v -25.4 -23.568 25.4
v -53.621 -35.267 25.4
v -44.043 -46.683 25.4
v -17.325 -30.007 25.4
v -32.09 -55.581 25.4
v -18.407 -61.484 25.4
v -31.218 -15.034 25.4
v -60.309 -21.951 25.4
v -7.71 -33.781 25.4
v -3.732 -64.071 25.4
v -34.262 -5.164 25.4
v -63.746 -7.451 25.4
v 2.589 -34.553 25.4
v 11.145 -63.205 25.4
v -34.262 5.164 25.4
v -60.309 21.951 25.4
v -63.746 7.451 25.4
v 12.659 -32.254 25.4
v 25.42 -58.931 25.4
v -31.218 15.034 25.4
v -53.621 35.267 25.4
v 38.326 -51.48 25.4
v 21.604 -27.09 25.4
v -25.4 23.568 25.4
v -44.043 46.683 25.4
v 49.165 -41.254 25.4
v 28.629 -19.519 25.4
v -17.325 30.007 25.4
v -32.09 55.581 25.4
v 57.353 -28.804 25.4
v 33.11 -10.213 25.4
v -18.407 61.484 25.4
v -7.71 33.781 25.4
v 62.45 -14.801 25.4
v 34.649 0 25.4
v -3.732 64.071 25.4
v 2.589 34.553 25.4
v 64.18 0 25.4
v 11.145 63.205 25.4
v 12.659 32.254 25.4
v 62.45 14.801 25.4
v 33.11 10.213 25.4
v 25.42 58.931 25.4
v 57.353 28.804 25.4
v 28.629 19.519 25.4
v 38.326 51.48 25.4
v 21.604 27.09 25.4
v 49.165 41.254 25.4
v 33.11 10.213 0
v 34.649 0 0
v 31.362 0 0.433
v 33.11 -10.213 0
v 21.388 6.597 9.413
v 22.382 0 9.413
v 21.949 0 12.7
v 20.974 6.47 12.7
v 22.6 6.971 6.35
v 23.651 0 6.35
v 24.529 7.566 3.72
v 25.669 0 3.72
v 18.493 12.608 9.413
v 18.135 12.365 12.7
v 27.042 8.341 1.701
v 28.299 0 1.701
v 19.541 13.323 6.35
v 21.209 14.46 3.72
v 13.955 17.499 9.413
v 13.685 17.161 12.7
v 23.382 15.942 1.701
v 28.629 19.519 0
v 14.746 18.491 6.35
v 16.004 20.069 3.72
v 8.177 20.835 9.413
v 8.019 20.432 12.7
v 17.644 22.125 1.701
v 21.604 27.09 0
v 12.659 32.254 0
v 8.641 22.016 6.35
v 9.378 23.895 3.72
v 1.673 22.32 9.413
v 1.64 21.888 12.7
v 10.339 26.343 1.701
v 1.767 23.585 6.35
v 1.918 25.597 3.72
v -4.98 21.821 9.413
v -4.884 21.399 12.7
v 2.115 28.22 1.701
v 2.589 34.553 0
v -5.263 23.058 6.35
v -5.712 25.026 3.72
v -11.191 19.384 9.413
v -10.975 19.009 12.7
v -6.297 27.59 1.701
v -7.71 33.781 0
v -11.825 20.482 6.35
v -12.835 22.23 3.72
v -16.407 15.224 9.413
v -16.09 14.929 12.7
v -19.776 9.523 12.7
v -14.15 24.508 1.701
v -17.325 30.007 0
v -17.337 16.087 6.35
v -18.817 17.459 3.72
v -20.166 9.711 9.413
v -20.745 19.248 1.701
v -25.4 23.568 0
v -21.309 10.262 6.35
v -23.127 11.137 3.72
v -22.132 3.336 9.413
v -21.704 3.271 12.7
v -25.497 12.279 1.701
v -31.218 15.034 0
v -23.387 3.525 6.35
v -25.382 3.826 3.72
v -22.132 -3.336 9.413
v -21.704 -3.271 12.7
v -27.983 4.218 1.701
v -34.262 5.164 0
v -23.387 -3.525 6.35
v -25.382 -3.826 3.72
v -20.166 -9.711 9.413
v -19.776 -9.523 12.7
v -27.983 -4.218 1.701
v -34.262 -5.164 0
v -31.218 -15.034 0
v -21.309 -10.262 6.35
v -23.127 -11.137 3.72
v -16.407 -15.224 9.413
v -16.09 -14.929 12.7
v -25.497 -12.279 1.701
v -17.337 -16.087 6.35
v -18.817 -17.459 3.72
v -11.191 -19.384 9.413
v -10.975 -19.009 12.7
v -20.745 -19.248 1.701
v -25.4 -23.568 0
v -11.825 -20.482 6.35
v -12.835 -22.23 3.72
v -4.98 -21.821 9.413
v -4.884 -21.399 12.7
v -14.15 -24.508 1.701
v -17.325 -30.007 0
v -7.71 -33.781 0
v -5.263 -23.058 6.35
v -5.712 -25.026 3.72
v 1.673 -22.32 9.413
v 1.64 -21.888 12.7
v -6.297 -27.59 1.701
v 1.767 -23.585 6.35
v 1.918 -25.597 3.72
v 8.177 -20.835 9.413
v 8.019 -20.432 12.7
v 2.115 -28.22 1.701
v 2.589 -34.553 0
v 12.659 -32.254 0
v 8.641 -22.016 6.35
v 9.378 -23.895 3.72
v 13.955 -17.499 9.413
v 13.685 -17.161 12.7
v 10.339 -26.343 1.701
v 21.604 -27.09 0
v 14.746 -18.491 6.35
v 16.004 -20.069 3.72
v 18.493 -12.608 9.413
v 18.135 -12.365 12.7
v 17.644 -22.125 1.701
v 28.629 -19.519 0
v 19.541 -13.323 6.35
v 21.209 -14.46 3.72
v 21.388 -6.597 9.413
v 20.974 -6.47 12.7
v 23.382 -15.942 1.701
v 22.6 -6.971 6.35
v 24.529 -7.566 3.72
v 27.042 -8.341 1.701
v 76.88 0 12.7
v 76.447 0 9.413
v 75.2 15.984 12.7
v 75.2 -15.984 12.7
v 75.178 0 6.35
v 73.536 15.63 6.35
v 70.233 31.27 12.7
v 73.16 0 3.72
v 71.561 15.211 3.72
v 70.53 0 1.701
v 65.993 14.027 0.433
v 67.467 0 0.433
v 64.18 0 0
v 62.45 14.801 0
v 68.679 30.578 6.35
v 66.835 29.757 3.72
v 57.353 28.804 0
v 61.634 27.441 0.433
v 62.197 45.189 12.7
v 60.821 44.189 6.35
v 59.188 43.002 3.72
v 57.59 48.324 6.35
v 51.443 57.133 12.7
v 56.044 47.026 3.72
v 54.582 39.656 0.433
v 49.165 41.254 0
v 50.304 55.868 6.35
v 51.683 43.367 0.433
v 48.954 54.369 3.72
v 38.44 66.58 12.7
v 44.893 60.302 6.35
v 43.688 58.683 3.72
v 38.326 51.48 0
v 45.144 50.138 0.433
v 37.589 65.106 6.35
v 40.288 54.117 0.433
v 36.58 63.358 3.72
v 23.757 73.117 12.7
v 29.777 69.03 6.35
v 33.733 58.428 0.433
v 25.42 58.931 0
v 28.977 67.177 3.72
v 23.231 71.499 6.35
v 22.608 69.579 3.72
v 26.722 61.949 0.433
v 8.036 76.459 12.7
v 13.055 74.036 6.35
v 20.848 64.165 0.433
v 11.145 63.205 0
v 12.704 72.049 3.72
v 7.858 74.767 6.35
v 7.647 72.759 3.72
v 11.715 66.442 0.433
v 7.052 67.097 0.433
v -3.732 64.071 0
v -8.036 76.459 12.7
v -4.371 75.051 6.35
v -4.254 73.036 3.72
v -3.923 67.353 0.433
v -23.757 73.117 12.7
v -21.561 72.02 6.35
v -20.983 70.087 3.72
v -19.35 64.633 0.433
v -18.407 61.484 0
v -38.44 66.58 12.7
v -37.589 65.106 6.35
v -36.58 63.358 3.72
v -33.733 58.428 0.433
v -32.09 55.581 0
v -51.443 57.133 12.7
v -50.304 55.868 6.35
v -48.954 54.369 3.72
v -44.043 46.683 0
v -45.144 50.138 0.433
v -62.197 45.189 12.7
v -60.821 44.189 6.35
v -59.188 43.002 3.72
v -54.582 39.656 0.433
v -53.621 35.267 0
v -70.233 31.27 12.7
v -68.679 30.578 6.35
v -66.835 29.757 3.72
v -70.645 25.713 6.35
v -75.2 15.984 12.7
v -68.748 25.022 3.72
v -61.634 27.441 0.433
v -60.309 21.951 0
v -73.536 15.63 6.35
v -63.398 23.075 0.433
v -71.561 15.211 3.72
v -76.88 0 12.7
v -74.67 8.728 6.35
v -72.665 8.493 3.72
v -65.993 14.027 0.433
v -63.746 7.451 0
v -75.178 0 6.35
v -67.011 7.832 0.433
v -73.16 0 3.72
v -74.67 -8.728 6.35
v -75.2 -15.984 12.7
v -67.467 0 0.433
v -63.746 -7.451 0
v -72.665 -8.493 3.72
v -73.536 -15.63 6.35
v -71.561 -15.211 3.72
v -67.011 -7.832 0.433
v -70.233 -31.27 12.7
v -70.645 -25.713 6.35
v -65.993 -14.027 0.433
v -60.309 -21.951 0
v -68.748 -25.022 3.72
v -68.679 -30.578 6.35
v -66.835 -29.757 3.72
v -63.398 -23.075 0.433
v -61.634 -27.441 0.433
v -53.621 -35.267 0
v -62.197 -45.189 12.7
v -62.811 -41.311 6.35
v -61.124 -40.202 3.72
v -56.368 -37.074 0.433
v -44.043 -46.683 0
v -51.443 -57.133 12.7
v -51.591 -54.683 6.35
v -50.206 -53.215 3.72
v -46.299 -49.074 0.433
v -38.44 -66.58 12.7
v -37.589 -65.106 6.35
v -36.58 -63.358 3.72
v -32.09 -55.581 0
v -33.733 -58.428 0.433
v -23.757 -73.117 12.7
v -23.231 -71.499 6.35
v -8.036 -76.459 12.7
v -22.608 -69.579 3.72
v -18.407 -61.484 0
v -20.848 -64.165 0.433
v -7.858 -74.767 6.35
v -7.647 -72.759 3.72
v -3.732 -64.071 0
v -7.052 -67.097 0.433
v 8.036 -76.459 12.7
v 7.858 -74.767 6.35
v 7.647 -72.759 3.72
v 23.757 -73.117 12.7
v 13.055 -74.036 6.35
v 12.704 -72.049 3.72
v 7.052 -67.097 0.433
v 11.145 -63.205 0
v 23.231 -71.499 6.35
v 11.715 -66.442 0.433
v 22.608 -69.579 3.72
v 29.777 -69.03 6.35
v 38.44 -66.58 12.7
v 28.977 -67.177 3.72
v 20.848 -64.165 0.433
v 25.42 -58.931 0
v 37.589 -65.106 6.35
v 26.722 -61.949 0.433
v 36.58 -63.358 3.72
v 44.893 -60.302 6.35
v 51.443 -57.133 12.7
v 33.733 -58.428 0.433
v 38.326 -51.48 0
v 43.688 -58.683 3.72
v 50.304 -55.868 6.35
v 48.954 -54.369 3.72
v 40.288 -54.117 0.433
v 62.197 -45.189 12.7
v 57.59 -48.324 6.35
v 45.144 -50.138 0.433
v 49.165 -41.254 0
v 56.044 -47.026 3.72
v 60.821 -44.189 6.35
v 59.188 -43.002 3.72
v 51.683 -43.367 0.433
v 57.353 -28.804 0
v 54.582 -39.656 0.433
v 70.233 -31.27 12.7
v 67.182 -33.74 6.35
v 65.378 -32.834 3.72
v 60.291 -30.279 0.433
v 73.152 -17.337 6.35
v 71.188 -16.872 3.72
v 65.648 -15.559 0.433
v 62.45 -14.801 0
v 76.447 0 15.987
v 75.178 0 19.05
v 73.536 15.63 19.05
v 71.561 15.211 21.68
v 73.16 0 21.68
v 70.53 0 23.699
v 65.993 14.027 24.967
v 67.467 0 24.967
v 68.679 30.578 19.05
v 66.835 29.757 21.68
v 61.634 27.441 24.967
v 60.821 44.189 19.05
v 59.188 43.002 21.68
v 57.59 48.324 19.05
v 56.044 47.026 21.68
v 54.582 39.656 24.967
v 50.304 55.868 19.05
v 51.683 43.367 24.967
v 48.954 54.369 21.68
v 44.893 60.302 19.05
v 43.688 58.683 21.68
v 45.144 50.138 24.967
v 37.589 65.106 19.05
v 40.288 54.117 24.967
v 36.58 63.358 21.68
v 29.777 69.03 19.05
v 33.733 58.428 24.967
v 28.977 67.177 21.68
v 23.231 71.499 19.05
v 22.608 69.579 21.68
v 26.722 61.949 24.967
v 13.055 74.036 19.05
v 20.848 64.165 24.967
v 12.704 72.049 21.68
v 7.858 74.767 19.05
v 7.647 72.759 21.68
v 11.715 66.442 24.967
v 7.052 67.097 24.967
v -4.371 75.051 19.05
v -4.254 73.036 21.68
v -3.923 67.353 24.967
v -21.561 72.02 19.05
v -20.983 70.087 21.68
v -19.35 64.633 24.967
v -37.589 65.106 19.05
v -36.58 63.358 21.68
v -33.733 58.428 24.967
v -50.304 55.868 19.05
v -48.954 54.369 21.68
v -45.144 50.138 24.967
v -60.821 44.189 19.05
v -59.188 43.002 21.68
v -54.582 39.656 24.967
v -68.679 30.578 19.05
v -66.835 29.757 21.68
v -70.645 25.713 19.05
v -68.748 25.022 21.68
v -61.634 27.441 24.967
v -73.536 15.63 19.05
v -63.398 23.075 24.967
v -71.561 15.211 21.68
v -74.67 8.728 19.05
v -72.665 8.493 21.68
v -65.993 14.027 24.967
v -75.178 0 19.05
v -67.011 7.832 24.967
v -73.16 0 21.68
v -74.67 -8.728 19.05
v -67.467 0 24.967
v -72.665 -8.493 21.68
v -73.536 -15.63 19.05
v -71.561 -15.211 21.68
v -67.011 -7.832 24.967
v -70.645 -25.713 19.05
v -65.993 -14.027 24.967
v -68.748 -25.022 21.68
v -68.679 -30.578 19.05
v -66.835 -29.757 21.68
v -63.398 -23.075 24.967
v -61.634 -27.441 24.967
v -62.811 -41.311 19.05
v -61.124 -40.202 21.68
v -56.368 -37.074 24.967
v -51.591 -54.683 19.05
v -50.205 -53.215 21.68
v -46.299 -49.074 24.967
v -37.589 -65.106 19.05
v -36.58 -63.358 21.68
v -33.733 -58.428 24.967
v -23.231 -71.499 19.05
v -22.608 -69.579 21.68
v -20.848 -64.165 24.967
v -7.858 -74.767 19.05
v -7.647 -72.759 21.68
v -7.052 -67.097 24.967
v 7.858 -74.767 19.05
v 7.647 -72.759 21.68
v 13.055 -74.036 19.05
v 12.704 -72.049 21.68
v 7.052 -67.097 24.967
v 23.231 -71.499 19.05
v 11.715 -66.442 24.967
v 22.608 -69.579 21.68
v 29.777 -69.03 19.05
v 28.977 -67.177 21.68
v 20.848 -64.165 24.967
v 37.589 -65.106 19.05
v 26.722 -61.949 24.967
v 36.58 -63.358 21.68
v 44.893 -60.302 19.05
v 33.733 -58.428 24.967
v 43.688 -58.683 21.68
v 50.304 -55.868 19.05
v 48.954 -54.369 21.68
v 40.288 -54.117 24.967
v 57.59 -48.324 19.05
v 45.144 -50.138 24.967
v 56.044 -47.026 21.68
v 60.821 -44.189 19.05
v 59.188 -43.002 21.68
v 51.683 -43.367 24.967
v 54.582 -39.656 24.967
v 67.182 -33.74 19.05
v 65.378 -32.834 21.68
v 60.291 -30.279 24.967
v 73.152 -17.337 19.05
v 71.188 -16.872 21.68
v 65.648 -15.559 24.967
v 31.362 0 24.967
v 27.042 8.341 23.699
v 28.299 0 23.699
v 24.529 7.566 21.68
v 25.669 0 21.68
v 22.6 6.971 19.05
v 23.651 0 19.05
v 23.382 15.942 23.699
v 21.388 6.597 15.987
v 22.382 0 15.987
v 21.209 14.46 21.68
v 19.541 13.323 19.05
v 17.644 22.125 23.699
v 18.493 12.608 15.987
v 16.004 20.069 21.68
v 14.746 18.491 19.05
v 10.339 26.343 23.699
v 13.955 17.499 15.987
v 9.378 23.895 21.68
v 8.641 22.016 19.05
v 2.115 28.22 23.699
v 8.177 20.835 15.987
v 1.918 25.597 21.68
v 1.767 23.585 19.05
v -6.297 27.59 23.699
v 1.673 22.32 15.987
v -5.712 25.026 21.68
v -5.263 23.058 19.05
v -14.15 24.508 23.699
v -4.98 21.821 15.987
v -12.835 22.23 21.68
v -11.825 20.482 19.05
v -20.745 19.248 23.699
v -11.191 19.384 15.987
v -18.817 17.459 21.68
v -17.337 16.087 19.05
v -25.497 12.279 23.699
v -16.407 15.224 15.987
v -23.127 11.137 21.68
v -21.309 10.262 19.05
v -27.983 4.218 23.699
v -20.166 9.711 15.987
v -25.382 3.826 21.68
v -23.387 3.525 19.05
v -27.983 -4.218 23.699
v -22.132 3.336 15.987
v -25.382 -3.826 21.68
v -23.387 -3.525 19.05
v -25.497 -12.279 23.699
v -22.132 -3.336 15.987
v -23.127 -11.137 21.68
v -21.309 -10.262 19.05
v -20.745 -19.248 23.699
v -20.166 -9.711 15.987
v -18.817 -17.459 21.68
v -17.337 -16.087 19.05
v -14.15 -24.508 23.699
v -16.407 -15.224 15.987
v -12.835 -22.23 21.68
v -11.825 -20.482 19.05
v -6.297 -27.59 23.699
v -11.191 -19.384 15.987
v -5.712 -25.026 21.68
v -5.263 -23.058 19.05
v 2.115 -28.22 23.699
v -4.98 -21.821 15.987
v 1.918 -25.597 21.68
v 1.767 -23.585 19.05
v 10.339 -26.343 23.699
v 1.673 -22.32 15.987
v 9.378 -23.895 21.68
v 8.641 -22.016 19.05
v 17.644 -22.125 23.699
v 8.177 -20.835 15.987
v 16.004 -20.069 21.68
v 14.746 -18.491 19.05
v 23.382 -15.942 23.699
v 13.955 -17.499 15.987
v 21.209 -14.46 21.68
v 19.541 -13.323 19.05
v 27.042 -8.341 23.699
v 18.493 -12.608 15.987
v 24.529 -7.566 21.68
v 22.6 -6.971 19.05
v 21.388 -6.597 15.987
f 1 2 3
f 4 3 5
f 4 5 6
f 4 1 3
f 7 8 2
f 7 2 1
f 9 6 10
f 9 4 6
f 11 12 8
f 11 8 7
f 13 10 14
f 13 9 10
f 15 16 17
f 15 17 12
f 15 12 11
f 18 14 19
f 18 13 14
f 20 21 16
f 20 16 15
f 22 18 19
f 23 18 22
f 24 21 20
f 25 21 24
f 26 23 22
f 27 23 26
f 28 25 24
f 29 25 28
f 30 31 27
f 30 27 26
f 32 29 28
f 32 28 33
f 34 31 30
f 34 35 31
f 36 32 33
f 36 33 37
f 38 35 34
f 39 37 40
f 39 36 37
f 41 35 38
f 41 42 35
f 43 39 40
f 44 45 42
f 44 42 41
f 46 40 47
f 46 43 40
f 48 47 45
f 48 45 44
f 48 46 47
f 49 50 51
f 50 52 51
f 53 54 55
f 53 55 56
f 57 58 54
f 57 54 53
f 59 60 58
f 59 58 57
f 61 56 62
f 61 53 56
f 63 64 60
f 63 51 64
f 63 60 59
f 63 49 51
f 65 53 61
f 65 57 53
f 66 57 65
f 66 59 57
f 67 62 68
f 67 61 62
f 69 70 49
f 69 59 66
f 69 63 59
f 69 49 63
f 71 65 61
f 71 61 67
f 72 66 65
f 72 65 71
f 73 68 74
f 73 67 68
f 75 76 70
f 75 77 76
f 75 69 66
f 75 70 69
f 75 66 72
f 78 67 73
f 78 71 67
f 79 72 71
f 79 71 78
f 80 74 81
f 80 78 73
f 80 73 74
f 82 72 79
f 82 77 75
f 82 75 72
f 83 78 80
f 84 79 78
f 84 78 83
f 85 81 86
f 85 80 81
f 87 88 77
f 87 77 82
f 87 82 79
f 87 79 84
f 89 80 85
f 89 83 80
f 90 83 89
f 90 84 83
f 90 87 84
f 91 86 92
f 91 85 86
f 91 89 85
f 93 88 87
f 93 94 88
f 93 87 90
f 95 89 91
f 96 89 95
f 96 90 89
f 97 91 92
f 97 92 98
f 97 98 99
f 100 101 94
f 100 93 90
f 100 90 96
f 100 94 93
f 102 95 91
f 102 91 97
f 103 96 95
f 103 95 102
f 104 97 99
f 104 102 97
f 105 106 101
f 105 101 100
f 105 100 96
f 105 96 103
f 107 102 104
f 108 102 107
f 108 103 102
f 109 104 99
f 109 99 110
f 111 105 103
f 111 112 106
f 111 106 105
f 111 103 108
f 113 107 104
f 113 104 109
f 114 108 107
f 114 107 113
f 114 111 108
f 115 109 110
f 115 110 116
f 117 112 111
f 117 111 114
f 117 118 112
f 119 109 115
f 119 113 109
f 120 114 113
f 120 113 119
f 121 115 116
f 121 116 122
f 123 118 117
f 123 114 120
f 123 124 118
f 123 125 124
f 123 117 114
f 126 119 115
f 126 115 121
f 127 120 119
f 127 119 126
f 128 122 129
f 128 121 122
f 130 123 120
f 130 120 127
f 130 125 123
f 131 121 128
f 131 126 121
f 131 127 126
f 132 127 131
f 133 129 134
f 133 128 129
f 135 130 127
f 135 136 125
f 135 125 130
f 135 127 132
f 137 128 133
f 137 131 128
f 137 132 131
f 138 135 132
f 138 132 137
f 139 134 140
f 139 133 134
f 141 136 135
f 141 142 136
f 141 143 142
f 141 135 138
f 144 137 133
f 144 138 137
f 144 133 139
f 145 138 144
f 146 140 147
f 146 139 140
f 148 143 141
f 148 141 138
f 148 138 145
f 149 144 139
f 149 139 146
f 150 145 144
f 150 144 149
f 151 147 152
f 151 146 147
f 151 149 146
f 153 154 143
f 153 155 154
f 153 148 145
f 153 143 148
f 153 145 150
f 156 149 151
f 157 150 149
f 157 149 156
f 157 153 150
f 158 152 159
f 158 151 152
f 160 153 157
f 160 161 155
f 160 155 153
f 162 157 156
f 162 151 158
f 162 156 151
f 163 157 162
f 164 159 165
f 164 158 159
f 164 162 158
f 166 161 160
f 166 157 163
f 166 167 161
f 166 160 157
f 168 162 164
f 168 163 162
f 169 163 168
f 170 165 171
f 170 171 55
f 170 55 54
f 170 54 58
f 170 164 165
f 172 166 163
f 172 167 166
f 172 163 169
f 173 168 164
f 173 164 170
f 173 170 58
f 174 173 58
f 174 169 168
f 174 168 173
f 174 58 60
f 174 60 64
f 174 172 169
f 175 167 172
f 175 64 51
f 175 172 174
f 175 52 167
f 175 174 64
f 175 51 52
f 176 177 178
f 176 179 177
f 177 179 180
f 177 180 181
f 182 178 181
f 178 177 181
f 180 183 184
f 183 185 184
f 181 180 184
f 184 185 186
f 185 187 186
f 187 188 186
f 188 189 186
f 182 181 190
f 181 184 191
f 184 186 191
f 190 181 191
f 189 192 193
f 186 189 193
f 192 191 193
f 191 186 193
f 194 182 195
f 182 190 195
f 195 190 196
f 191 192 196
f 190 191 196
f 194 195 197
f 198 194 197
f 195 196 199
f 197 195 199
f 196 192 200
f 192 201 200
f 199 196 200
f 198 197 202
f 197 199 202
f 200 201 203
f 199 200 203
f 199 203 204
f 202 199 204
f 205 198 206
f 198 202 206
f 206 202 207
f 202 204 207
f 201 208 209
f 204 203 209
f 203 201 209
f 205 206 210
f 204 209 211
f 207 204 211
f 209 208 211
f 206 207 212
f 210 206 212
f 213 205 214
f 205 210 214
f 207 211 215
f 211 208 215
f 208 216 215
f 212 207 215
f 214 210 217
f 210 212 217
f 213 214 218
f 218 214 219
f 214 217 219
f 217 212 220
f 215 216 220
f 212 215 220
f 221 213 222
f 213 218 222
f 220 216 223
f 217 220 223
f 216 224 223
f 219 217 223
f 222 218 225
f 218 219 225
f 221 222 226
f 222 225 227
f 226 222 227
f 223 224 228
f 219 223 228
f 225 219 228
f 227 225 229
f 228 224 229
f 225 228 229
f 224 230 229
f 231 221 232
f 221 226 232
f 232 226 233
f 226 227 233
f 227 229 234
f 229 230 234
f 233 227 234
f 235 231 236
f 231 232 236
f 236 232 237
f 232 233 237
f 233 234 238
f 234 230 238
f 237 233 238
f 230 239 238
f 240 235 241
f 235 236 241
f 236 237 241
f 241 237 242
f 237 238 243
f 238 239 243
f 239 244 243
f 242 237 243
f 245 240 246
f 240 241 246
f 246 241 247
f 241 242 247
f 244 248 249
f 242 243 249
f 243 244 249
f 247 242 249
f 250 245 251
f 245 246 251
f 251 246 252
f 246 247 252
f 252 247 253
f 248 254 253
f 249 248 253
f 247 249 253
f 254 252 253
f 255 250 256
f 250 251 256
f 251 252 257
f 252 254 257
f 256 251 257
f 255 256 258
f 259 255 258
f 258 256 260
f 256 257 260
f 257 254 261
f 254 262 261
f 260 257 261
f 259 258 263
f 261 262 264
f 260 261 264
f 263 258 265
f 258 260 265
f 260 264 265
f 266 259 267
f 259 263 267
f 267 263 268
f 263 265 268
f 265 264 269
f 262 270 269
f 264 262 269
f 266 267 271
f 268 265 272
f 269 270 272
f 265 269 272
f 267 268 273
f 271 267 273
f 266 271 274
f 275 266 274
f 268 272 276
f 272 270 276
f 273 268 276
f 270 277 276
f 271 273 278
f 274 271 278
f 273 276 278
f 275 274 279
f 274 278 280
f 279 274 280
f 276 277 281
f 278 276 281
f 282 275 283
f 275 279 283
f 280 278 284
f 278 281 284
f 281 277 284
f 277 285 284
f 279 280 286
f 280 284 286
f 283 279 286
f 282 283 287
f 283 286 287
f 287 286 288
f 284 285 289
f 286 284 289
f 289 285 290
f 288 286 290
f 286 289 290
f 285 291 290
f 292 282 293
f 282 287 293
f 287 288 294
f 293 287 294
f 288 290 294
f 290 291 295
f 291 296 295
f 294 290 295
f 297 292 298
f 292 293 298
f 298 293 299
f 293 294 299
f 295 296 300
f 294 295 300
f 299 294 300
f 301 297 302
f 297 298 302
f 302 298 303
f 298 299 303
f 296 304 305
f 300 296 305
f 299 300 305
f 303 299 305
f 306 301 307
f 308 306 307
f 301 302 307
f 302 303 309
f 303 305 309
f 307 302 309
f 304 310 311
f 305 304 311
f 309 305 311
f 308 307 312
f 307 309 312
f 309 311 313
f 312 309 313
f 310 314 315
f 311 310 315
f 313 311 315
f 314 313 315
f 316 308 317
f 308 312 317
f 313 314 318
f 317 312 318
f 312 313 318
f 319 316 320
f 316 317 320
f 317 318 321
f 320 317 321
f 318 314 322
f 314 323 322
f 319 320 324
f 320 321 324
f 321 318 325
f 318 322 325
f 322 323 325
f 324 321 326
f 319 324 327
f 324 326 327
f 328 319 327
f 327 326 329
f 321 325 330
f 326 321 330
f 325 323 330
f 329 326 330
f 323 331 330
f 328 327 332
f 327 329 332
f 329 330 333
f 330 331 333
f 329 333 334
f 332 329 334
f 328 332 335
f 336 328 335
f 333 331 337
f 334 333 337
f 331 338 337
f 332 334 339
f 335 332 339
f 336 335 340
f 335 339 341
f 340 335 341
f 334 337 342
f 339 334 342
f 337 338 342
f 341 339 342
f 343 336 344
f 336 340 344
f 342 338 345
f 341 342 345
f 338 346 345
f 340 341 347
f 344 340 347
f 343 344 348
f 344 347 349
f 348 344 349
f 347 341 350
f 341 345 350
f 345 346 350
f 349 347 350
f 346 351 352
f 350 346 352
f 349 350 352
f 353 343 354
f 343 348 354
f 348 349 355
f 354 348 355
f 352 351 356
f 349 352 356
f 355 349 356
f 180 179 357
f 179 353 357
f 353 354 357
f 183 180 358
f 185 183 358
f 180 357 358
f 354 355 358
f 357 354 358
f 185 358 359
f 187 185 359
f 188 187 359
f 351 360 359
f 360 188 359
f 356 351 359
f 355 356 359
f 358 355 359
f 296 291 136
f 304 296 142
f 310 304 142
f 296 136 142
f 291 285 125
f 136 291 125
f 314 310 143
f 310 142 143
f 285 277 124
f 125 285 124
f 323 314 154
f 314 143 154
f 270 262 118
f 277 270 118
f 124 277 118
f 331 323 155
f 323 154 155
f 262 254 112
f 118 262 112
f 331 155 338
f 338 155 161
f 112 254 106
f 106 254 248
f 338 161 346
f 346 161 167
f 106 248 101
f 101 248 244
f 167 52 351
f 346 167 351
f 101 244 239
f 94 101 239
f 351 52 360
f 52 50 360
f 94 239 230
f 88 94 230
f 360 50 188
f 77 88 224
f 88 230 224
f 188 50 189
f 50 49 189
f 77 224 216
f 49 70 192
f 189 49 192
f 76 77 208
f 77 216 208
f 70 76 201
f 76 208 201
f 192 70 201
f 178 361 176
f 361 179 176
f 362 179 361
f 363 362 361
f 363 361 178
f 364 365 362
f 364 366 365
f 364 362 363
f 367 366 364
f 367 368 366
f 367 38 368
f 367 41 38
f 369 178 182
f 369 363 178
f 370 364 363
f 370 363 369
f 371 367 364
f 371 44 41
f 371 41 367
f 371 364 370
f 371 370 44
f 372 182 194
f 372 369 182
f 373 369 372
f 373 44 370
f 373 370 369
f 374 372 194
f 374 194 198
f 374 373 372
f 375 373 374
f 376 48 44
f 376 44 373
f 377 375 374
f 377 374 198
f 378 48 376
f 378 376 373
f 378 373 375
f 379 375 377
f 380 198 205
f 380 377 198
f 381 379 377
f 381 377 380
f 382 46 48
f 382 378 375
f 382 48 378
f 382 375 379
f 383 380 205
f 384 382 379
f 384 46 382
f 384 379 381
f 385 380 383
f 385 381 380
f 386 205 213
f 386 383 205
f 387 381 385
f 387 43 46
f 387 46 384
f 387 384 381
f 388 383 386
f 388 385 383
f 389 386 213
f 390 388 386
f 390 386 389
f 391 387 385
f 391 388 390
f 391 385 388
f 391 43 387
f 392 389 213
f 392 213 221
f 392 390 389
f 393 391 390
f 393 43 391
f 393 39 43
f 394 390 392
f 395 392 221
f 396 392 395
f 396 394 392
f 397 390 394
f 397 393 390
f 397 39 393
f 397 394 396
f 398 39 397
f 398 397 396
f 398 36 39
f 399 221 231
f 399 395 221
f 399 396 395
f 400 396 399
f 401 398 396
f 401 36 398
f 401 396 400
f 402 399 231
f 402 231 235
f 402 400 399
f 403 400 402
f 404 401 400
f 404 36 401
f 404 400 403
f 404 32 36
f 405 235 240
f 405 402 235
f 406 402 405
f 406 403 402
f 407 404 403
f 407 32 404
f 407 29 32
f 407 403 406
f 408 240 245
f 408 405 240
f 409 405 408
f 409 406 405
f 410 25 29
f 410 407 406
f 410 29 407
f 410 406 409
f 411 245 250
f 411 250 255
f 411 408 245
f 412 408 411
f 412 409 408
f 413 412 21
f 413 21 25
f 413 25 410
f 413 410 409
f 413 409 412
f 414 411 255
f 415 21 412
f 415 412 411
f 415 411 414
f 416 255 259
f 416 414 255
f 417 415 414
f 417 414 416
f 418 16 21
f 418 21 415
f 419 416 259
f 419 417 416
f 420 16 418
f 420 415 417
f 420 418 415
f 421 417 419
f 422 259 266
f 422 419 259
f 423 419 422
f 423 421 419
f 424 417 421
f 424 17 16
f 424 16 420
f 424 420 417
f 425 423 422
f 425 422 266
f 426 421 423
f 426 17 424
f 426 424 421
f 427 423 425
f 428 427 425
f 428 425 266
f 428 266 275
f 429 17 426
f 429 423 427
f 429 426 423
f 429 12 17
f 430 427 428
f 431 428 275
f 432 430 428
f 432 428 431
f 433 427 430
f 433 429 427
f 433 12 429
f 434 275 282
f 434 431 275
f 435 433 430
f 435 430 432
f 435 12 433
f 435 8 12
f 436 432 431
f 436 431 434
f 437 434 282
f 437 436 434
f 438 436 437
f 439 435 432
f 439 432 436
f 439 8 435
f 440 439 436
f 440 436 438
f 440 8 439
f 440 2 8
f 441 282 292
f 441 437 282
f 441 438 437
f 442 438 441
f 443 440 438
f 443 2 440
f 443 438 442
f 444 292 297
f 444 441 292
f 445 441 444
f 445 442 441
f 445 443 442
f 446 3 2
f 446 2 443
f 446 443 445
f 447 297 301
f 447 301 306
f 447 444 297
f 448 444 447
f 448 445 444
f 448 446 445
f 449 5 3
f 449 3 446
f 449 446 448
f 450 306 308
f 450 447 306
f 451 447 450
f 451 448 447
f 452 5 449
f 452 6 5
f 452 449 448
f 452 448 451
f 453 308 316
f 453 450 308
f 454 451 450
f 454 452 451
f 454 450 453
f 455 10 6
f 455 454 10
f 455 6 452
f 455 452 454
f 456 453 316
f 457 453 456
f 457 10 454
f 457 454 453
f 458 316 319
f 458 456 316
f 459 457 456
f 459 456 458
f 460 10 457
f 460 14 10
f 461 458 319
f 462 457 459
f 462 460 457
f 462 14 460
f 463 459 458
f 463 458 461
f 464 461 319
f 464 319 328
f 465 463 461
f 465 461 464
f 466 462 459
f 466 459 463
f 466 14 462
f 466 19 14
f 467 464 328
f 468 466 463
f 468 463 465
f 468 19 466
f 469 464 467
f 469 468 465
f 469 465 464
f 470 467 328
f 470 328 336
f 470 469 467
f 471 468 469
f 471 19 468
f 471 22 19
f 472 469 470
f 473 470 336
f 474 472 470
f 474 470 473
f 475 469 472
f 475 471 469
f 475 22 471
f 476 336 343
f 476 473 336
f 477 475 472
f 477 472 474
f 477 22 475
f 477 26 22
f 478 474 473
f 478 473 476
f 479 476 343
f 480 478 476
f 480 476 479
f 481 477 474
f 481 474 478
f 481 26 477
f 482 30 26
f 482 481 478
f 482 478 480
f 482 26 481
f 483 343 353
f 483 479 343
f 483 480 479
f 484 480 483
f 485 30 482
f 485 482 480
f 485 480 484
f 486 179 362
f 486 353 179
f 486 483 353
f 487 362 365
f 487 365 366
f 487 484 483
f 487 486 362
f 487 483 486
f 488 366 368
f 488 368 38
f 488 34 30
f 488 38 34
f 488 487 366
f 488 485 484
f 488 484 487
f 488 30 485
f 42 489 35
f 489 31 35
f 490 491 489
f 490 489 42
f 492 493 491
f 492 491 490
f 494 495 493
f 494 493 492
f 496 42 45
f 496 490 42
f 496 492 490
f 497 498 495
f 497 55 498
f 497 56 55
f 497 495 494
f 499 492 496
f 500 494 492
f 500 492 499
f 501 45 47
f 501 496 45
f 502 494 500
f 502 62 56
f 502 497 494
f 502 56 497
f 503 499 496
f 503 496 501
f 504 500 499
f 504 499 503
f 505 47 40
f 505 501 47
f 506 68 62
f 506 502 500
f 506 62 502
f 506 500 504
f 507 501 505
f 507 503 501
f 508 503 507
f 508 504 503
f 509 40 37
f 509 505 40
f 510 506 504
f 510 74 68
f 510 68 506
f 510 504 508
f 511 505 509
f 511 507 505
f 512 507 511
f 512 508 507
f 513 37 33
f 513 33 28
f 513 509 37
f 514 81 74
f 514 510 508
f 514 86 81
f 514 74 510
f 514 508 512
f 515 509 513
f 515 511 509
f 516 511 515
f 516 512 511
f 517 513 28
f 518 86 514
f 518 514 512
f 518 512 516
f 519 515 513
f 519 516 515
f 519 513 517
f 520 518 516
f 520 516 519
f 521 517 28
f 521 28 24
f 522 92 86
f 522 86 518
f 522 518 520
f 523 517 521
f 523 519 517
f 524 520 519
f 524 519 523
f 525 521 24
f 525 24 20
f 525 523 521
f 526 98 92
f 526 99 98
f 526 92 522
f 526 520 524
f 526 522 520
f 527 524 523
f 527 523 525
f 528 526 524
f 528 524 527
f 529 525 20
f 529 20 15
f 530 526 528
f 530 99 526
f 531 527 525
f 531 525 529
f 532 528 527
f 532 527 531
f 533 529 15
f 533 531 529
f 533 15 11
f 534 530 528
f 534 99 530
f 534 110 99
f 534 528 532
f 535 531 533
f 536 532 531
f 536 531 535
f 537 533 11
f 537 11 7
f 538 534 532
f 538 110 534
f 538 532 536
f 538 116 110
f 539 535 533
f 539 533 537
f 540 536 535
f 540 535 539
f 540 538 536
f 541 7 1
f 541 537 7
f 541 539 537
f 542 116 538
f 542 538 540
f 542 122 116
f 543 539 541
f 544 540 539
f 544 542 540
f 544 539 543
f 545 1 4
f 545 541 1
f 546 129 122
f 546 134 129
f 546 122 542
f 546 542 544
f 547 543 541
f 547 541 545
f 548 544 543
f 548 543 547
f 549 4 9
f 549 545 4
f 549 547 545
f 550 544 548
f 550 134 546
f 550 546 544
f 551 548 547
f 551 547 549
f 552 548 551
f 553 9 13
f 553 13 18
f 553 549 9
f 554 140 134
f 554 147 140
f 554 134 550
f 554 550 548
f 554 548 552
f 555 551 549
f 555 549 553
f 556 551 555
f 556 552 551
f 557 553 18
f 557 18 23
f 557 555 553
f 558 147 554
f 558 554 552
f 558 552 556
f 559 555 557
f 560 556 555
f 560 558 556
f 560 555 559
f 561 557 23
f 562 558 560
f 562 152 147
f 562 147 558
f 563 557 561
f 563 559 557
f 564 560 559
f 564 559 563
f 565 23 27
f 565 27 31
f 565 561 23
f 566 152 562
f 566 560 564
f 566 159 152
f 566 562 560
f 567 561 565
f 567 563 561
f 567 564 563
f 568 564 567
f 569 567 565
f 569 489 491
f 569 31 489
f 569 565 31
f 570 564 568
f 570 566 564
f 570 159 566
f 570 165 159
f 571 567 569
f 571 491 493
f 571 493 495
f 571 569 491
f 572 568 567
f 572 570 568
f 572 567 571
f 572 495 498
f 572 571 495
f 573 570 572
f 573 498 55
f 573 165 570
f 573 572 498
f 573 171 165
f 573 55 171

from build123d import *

# Parameters (mm, degrees)
F0_R     = 76.8798317076
F0_R_2   = 21.949412209
F1_DEPTH = 25.4
F2_R     = 12.7
F3_R     = 12.69999
F4_R     = 12.7
F5_R     = 12.69999


# Not quite as in the source:
# - a fillet or chamfer is up to 0.001 mm smaller than in the source, because OpenCascade refuses the exact size


with BuildPart() as f1:
    # F0 (on Top) → F1 (new body)
    with BuildSketch(Plane.XY):
        Circle(F0_R)
        Circle(F0_R_2, mode=Mode.SUBTRACT)
    extrude(amount=F1_DEPTH)

    # F2
    f2_edges = [f1.edges().sort_by_distance(p)[0] for p in [
        (-76.879832, 0, 25.4),
    ]]
    fillet(f2_edges, radius=F2_R)

    # F3 (radius 12.7 in the source; OpenCascade refuses exactly that, so slightly less here)
    f3_edges = [f1.edges().sort_by_distance(p)[0] for p in [
        (-76.879832, 0, 0),
    ]]
    fillet(f3_edges, radius=F3_R)

    # F4
    f4_edges = [f1.edges().sort_by_distance(p)[0] for p in [
        (-21.949412, 0, 25.4),
    ]]
    fillet(f4_edges, radius=F4_R)

    # F5 (radius 12.7 in the source; OpenCascade refuses exactly that, so slightly less here)
    f5_edges = [f1.edges().sort_by_distance(p)[0] for p in [
        (-21.949412, 0, 0),
    ]]
    fillet(f5_edges, radius=F5_R)


solid = f1.part
